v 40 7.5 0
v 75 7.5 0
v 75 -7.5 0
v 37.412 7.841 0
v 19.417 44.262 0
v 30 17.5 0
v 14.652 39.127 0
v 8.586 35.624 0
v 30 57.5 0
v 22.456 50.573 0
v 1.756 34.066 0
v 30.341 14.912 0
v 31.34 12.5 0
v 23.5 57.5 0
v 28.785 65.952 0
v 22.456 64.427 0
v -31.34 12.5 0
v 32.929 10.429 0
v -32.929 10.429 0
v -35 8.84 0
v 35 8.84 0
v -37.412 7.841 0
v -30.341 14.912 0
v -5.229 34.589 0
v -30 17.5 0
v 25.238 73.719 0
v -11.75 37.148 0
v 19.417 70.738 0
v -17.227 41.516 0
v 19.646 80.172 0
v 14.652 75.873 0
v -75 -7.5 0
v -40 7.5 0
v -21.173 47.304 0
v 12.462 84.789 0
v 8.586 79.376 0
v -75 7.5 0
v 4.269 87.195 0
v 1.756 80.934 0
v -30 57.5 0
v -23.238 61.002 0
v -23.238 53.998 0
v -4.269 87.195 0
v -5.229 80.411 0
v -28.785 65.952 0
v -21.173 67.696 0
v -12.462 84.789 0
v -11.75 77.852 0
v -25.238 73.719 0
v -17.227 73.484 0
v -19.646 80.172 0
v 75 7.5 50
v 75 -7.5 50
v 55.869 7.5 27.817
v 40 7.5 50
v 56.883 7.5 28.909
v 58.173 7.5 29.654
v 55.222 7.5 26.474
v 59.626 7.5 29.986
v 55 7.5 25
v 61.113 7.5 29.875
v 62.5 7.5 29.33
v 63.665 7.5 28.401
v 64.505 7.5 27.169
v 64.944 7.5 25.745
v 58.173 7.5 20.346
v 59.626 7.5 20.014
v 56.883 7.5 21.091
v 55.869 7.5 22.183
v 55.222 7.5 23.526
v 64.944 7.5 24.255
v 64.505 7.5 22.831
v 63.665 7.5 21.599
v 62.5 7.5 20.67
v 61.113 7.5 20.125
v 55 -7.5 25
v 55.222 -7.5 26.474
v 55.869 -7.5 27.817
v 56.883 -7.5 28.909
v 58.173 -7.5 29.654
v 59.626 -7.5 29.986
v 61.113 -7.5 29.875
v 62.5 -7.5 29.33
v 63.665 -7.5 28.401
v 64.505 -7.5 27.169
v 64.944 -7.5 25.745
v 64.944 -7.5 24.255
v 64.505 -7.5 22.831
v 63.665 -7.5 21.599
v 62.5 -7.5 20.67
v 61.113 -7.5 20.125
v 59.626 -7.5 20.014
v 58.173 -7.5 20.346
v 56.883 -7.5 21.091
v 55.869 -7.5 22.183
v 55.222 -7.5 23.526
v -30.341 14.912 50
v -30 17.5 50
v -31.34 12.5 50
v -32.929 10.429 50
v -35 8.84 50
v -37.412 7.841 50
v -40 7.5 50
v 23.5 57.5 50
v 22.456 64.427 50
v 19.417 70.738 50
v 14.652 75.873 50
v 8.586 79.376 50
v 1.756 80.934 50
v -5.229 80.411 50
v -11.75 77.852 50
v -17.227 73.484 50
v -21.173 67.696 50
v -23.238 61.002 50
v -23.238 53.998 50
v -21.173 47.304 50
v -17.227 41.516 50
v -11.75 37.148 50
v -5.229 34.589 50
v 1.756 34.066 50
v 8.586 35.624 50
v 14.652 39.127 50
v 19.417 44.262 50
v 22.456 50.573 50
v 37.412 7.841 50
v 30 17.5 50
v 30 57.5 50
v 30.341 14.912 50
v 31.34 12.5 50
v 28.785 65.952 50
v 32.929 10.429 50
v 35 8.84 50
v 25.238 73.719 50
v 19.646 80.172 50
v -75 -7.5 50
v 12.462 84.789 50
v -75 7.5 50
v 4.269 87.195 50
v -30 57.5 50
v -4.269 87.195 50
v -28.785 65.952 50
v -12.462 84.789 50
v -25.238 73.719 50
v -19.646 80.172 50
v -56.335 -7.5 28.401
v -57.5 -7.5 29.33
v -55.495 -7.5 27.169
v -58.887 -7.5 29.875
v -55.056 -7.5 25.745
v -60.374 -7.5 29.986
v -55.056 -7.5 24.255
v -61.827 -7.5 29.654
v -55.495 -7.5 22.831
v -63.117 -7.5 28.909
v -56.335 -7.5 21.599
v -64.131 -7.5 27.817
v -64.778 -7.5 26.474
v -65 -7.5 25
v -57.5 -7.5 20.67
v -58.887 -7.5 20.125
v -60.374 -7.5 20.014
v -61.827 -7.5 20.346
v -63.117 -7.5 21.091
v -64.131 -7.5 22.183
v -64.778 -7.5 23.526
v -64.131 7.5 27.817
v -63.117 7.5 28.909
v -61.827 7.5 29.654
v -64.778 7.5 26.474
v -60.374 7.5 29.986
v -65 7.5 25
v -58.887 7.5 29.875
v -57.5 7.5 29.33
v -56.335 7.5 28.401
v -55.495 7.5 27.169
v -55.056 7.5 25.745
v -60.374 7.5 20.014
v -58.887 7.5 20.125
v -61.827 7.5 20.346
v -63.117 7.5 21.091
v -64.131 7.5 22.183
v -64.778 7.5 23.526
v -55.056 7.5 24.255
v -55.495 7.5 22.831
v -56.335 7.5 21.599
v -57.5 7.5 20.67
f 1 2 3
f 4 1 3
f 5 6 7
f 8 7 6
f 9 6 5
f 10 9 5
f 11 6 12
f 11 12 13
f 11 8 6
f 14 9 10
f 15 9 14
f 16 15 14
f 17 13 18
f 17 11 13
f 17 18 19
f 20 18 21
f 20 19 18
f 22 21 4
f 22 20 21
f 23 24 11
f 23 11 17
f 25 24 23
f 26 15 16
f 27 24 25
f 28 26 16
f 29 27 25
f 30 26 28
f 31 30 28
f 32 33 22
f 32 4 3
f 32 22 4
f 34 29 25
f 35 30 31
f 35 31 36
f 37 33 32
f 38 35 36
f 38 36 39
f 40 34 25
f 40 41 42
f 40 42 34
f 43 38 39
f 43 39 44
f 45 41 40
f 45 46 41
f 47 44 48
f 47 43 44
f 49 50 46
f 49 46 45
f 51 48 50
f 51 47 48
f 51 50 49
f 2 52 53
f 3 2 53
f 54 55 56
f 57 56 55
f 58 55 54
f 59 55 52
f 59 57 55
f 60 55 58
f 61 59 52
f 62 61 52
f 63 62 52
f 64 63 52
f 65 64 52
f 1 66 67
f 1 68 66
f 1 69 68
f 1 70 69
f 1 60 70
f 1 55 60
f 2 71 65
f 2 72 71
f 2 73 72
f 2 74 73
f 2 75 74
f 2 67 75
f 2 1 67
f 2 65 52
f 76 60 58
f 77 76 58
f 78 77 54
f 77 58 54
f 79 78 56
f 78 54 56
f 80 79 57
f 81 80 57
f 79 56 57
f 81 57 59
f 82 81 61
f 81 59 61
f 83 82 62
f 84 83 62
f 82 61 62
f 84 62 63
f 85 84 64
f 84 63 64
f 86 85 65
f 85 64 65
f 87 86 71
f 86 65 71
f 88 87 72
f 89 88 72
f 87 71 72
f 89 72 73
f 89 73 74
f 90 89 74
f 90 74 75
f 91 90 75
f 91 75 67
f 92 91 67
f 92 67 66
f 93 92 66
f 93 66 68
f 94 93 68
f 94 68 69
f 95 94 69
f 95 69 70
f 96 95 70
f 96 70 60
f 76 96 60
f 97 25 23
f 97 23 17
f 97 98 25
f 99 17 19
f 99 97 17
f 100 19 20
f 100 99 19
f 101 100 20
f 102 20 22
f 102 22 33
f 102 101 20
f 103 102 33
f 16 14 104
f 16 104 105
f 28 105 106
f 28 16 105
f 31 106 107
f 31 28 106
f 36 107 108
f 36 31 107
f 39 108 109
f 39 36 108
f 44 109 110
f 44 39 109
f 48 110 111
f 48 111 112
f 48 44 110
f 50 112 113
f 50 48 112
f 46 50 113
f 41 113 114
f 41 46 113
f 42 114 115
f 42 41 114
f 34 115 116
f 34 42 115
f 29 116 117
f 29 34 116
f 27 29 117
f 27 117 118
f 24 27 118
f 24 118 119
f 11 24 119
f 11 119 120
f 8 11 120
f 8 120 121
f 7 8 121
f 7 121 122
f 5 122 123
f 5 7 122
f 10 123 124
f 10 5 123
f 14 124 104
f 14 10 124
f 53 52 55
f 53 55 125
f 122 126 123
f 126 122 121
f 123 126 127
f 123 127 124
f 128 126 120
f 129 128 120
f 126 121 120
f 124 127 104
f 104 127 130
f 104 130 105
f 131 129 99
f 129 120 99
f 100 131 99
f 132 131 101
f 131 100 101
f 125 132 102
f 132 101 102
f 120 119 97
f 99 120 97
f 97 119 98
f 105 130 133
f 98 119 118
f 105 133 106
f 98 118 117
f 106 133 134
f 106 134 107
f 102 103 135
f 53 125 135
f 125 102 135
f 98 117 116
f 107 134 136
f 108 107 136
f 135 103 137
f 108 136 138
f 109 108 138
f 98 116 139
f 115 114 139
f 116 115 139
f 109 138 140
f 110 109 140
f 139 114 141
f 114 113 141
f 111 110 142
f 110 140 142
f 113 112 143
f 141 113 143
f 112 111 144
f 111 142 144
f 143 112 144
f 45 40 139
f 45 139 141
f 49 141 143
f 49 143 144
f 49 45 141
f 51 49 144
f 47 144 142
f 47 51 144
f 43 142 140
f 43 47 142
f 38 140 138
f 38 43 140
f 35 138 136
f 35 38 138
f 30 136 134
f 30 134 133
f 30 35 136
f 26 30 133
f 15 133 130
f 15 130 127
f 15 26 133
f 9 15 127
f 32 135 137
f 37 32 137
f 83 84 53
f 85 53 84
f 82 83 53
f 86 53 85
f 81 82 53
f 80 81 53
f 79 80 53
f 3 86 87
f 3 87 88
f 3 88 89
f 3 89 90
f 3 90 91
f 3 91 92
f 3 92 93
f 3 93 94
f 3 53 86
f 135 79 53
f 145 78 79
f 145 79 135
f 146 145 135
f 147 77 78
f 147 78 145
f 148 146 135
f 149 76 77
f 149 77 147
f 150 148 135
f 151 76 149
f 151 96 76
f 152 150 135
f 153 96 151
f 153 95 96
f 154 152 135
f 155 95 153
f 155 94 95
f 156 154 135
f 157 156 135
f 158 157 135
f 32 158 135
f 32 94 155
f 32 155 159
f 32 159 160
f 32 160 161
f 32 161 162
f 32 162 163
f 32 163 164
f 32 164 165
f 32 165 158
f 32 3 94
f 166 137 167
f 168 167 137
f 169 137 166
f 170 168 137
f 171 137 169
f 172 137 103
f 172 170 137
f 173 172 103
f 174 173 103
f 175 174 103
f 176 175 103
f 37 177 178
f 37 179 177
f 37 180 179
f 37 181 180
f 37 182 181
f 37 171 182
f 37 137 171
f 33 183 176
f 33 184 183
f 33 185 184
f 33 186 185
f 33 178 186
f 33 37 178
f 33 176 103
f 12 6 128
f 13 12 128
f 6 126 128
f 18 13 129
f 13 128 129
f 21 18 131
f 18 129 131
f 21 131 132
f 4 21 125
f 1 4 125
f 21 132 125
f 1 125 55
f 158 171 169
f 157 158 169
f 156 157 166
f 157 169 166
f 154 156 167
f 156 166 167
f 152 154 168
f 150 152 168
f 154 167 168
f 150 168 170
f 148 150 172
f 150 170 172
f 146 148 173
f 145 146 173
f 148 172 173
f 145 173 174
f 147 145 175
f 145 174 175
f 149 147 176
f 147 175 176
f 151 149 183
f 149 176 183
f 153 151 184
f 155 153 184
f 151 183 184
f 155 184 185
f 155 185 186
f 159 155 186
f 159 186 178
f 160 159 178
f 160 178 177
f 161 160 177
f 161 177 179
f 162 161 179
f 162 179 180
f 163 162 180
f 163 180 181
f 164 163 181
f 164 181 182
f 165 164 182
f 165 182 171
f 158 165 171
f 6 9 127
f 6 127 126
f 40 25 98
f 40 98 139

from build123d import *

# Parameters (mm, degrees)
IZIM1_R                     = 23.5
Y_KSEKLIK_EKSTR_ZYON1_DEPTH = 50
RADYUS1_R                   = 10
IZIM2_R                     = 5
KES_EKSTR_ZYON1_DEPTH       = 50


with BuildPart() as part:
    # Çizim1 → Yükseklik-Ekstrüzyon1 (new body)
    with BuildSketch(Plane.XY):
        with BuildLine():
            Line((-30, 7.5), (-30, 57.5))
            ThreePointArc((-30, 57.5), (0, 87.5), (30, 57.5))
            Line((30, 57.5), (30, 7.5))
            Line((30, 7.5), (75, 7.5))
            Line((75, 7.5), (75, -7.5))
            Line((75, -7.5), (-75, -7.5))
            Line((-75, -7.5), (-75, 7.5))
            Line((-75, 7.5), (-30, 7.5))
        make_face()
        with Locations((0, 57.5)):
            Circle(IZIM1_R, mode=Mode.SUBTRACT)
    extrude(amount=Y_KSEKLIK_EKSTR_ZYON1_DEPTH)

    # Radyus1
    radyus1_edges = [part.edges().sort_by_distance(p)[0] for p in [
        (-30, 7.5, 25),
        (30, 7.5, 25),
    ]]
    fillet(radyus1_edges, radius=RADYUS1_R)

    # Çizim2 → Kes-Ekstrüzyon1 (cut)
    with BuildSketch(Plane(origin=(0, 7.5, 0), x_dir=(1, 0, 0), z_dir=(0, 1, 0))):
        with Locations(Location((-60, -25, 0), (0, 0, 180))):
            Circle(IZIM2_R)
        with Locations(Location((60, -25, 0), (0, 0, 180))):
            Circle(IZIM2_R)
    extrude(amount=-KES_EKSTR_ZYON1_DEPTH, mode=Mode.SUBTRACT)


solid = part.part
